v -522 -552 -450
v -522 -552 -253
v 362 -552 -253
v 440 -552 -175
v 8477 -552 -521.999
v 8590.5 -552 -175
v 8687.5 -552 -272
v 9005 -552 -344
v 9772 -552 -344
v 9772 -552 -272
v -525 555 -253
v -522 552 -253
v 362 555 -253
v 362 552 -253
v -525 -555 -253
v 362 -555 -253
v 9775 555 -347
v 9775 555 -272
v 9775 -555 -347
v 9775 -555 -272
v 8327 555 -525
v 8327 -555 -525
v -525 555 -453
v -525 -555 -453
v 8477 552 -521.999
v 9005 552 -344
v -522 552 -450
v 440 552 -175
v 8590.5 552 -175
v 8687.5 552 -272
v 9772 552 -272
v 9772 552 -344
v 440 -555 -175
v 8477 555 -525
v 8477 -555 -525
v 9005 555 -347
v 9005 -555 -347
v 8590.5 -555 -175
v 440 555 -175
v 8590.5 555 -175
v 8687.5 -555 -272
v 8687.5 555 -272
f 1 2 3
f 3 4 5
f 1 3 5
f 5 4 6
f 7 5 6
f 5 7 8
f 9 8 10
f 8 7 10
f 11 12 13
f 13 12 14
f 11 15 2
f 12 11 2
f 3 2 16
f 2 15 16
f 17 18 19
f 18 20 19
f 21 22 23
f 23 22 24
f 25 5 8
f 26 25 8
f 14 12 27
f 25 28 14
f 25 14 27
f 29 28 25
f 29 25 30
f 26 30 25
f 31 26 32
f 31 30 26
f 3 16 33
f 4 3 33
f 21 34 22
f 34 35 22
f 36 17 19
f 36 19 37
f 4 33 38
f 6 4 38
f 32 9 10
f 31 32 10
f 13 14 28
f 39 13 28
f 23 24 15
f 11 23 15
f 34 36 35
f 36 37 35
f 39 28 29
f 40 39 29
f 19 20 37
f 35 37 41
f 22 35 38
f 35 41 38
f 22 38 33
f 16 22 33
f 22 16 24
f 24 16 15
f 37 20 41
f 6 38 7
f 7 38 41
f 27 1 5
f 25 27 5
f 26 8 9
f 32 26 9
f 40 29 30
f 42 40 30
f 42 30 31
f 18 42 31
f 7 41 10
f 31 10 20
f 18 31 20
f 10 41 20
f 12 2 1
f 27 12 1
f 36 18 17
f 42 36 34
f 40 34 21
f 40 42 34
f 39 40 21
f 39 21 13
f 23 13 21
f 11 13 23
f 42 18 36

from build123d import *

# Parameters (mm, degrees)
EXTRUDE034_DEPTH = 552
EXTRUDE015_DEPTH = 555


with BuildPart() as extrude034:
    # Sketch035 → Extrude034 (new body, symmetric)
    with BuildSketch(Plane.XZ):
        Polygon((-522, -60), (-522, -450), (8477, -521.999457), (9005, -344), (9772, -344), (9772, -60), align=None)
    extrude(amount=EXTRUDE034_DEPTH, both=True)


with BuildPart() as cut003:
    # Sketch023 → Extrude015 (new body, symmetric)
    with BuildSketch(Plane.XZ):
        Polygon((-525, -253), (362, -253), (440, -175), (8590.5, -175), (8687.5, -272), (9775, -272), (9775, -347), (9005, -347), (8477, -525), (8327, -525), (-525, -453), align=None)
    extrude(amount=EXTRUDE015_DEPTH, both=True)

    # Cut003: cut Extrude034
    add(extrude034.part, mode=Mode.SUBTRACT)


solid = cut003.part
